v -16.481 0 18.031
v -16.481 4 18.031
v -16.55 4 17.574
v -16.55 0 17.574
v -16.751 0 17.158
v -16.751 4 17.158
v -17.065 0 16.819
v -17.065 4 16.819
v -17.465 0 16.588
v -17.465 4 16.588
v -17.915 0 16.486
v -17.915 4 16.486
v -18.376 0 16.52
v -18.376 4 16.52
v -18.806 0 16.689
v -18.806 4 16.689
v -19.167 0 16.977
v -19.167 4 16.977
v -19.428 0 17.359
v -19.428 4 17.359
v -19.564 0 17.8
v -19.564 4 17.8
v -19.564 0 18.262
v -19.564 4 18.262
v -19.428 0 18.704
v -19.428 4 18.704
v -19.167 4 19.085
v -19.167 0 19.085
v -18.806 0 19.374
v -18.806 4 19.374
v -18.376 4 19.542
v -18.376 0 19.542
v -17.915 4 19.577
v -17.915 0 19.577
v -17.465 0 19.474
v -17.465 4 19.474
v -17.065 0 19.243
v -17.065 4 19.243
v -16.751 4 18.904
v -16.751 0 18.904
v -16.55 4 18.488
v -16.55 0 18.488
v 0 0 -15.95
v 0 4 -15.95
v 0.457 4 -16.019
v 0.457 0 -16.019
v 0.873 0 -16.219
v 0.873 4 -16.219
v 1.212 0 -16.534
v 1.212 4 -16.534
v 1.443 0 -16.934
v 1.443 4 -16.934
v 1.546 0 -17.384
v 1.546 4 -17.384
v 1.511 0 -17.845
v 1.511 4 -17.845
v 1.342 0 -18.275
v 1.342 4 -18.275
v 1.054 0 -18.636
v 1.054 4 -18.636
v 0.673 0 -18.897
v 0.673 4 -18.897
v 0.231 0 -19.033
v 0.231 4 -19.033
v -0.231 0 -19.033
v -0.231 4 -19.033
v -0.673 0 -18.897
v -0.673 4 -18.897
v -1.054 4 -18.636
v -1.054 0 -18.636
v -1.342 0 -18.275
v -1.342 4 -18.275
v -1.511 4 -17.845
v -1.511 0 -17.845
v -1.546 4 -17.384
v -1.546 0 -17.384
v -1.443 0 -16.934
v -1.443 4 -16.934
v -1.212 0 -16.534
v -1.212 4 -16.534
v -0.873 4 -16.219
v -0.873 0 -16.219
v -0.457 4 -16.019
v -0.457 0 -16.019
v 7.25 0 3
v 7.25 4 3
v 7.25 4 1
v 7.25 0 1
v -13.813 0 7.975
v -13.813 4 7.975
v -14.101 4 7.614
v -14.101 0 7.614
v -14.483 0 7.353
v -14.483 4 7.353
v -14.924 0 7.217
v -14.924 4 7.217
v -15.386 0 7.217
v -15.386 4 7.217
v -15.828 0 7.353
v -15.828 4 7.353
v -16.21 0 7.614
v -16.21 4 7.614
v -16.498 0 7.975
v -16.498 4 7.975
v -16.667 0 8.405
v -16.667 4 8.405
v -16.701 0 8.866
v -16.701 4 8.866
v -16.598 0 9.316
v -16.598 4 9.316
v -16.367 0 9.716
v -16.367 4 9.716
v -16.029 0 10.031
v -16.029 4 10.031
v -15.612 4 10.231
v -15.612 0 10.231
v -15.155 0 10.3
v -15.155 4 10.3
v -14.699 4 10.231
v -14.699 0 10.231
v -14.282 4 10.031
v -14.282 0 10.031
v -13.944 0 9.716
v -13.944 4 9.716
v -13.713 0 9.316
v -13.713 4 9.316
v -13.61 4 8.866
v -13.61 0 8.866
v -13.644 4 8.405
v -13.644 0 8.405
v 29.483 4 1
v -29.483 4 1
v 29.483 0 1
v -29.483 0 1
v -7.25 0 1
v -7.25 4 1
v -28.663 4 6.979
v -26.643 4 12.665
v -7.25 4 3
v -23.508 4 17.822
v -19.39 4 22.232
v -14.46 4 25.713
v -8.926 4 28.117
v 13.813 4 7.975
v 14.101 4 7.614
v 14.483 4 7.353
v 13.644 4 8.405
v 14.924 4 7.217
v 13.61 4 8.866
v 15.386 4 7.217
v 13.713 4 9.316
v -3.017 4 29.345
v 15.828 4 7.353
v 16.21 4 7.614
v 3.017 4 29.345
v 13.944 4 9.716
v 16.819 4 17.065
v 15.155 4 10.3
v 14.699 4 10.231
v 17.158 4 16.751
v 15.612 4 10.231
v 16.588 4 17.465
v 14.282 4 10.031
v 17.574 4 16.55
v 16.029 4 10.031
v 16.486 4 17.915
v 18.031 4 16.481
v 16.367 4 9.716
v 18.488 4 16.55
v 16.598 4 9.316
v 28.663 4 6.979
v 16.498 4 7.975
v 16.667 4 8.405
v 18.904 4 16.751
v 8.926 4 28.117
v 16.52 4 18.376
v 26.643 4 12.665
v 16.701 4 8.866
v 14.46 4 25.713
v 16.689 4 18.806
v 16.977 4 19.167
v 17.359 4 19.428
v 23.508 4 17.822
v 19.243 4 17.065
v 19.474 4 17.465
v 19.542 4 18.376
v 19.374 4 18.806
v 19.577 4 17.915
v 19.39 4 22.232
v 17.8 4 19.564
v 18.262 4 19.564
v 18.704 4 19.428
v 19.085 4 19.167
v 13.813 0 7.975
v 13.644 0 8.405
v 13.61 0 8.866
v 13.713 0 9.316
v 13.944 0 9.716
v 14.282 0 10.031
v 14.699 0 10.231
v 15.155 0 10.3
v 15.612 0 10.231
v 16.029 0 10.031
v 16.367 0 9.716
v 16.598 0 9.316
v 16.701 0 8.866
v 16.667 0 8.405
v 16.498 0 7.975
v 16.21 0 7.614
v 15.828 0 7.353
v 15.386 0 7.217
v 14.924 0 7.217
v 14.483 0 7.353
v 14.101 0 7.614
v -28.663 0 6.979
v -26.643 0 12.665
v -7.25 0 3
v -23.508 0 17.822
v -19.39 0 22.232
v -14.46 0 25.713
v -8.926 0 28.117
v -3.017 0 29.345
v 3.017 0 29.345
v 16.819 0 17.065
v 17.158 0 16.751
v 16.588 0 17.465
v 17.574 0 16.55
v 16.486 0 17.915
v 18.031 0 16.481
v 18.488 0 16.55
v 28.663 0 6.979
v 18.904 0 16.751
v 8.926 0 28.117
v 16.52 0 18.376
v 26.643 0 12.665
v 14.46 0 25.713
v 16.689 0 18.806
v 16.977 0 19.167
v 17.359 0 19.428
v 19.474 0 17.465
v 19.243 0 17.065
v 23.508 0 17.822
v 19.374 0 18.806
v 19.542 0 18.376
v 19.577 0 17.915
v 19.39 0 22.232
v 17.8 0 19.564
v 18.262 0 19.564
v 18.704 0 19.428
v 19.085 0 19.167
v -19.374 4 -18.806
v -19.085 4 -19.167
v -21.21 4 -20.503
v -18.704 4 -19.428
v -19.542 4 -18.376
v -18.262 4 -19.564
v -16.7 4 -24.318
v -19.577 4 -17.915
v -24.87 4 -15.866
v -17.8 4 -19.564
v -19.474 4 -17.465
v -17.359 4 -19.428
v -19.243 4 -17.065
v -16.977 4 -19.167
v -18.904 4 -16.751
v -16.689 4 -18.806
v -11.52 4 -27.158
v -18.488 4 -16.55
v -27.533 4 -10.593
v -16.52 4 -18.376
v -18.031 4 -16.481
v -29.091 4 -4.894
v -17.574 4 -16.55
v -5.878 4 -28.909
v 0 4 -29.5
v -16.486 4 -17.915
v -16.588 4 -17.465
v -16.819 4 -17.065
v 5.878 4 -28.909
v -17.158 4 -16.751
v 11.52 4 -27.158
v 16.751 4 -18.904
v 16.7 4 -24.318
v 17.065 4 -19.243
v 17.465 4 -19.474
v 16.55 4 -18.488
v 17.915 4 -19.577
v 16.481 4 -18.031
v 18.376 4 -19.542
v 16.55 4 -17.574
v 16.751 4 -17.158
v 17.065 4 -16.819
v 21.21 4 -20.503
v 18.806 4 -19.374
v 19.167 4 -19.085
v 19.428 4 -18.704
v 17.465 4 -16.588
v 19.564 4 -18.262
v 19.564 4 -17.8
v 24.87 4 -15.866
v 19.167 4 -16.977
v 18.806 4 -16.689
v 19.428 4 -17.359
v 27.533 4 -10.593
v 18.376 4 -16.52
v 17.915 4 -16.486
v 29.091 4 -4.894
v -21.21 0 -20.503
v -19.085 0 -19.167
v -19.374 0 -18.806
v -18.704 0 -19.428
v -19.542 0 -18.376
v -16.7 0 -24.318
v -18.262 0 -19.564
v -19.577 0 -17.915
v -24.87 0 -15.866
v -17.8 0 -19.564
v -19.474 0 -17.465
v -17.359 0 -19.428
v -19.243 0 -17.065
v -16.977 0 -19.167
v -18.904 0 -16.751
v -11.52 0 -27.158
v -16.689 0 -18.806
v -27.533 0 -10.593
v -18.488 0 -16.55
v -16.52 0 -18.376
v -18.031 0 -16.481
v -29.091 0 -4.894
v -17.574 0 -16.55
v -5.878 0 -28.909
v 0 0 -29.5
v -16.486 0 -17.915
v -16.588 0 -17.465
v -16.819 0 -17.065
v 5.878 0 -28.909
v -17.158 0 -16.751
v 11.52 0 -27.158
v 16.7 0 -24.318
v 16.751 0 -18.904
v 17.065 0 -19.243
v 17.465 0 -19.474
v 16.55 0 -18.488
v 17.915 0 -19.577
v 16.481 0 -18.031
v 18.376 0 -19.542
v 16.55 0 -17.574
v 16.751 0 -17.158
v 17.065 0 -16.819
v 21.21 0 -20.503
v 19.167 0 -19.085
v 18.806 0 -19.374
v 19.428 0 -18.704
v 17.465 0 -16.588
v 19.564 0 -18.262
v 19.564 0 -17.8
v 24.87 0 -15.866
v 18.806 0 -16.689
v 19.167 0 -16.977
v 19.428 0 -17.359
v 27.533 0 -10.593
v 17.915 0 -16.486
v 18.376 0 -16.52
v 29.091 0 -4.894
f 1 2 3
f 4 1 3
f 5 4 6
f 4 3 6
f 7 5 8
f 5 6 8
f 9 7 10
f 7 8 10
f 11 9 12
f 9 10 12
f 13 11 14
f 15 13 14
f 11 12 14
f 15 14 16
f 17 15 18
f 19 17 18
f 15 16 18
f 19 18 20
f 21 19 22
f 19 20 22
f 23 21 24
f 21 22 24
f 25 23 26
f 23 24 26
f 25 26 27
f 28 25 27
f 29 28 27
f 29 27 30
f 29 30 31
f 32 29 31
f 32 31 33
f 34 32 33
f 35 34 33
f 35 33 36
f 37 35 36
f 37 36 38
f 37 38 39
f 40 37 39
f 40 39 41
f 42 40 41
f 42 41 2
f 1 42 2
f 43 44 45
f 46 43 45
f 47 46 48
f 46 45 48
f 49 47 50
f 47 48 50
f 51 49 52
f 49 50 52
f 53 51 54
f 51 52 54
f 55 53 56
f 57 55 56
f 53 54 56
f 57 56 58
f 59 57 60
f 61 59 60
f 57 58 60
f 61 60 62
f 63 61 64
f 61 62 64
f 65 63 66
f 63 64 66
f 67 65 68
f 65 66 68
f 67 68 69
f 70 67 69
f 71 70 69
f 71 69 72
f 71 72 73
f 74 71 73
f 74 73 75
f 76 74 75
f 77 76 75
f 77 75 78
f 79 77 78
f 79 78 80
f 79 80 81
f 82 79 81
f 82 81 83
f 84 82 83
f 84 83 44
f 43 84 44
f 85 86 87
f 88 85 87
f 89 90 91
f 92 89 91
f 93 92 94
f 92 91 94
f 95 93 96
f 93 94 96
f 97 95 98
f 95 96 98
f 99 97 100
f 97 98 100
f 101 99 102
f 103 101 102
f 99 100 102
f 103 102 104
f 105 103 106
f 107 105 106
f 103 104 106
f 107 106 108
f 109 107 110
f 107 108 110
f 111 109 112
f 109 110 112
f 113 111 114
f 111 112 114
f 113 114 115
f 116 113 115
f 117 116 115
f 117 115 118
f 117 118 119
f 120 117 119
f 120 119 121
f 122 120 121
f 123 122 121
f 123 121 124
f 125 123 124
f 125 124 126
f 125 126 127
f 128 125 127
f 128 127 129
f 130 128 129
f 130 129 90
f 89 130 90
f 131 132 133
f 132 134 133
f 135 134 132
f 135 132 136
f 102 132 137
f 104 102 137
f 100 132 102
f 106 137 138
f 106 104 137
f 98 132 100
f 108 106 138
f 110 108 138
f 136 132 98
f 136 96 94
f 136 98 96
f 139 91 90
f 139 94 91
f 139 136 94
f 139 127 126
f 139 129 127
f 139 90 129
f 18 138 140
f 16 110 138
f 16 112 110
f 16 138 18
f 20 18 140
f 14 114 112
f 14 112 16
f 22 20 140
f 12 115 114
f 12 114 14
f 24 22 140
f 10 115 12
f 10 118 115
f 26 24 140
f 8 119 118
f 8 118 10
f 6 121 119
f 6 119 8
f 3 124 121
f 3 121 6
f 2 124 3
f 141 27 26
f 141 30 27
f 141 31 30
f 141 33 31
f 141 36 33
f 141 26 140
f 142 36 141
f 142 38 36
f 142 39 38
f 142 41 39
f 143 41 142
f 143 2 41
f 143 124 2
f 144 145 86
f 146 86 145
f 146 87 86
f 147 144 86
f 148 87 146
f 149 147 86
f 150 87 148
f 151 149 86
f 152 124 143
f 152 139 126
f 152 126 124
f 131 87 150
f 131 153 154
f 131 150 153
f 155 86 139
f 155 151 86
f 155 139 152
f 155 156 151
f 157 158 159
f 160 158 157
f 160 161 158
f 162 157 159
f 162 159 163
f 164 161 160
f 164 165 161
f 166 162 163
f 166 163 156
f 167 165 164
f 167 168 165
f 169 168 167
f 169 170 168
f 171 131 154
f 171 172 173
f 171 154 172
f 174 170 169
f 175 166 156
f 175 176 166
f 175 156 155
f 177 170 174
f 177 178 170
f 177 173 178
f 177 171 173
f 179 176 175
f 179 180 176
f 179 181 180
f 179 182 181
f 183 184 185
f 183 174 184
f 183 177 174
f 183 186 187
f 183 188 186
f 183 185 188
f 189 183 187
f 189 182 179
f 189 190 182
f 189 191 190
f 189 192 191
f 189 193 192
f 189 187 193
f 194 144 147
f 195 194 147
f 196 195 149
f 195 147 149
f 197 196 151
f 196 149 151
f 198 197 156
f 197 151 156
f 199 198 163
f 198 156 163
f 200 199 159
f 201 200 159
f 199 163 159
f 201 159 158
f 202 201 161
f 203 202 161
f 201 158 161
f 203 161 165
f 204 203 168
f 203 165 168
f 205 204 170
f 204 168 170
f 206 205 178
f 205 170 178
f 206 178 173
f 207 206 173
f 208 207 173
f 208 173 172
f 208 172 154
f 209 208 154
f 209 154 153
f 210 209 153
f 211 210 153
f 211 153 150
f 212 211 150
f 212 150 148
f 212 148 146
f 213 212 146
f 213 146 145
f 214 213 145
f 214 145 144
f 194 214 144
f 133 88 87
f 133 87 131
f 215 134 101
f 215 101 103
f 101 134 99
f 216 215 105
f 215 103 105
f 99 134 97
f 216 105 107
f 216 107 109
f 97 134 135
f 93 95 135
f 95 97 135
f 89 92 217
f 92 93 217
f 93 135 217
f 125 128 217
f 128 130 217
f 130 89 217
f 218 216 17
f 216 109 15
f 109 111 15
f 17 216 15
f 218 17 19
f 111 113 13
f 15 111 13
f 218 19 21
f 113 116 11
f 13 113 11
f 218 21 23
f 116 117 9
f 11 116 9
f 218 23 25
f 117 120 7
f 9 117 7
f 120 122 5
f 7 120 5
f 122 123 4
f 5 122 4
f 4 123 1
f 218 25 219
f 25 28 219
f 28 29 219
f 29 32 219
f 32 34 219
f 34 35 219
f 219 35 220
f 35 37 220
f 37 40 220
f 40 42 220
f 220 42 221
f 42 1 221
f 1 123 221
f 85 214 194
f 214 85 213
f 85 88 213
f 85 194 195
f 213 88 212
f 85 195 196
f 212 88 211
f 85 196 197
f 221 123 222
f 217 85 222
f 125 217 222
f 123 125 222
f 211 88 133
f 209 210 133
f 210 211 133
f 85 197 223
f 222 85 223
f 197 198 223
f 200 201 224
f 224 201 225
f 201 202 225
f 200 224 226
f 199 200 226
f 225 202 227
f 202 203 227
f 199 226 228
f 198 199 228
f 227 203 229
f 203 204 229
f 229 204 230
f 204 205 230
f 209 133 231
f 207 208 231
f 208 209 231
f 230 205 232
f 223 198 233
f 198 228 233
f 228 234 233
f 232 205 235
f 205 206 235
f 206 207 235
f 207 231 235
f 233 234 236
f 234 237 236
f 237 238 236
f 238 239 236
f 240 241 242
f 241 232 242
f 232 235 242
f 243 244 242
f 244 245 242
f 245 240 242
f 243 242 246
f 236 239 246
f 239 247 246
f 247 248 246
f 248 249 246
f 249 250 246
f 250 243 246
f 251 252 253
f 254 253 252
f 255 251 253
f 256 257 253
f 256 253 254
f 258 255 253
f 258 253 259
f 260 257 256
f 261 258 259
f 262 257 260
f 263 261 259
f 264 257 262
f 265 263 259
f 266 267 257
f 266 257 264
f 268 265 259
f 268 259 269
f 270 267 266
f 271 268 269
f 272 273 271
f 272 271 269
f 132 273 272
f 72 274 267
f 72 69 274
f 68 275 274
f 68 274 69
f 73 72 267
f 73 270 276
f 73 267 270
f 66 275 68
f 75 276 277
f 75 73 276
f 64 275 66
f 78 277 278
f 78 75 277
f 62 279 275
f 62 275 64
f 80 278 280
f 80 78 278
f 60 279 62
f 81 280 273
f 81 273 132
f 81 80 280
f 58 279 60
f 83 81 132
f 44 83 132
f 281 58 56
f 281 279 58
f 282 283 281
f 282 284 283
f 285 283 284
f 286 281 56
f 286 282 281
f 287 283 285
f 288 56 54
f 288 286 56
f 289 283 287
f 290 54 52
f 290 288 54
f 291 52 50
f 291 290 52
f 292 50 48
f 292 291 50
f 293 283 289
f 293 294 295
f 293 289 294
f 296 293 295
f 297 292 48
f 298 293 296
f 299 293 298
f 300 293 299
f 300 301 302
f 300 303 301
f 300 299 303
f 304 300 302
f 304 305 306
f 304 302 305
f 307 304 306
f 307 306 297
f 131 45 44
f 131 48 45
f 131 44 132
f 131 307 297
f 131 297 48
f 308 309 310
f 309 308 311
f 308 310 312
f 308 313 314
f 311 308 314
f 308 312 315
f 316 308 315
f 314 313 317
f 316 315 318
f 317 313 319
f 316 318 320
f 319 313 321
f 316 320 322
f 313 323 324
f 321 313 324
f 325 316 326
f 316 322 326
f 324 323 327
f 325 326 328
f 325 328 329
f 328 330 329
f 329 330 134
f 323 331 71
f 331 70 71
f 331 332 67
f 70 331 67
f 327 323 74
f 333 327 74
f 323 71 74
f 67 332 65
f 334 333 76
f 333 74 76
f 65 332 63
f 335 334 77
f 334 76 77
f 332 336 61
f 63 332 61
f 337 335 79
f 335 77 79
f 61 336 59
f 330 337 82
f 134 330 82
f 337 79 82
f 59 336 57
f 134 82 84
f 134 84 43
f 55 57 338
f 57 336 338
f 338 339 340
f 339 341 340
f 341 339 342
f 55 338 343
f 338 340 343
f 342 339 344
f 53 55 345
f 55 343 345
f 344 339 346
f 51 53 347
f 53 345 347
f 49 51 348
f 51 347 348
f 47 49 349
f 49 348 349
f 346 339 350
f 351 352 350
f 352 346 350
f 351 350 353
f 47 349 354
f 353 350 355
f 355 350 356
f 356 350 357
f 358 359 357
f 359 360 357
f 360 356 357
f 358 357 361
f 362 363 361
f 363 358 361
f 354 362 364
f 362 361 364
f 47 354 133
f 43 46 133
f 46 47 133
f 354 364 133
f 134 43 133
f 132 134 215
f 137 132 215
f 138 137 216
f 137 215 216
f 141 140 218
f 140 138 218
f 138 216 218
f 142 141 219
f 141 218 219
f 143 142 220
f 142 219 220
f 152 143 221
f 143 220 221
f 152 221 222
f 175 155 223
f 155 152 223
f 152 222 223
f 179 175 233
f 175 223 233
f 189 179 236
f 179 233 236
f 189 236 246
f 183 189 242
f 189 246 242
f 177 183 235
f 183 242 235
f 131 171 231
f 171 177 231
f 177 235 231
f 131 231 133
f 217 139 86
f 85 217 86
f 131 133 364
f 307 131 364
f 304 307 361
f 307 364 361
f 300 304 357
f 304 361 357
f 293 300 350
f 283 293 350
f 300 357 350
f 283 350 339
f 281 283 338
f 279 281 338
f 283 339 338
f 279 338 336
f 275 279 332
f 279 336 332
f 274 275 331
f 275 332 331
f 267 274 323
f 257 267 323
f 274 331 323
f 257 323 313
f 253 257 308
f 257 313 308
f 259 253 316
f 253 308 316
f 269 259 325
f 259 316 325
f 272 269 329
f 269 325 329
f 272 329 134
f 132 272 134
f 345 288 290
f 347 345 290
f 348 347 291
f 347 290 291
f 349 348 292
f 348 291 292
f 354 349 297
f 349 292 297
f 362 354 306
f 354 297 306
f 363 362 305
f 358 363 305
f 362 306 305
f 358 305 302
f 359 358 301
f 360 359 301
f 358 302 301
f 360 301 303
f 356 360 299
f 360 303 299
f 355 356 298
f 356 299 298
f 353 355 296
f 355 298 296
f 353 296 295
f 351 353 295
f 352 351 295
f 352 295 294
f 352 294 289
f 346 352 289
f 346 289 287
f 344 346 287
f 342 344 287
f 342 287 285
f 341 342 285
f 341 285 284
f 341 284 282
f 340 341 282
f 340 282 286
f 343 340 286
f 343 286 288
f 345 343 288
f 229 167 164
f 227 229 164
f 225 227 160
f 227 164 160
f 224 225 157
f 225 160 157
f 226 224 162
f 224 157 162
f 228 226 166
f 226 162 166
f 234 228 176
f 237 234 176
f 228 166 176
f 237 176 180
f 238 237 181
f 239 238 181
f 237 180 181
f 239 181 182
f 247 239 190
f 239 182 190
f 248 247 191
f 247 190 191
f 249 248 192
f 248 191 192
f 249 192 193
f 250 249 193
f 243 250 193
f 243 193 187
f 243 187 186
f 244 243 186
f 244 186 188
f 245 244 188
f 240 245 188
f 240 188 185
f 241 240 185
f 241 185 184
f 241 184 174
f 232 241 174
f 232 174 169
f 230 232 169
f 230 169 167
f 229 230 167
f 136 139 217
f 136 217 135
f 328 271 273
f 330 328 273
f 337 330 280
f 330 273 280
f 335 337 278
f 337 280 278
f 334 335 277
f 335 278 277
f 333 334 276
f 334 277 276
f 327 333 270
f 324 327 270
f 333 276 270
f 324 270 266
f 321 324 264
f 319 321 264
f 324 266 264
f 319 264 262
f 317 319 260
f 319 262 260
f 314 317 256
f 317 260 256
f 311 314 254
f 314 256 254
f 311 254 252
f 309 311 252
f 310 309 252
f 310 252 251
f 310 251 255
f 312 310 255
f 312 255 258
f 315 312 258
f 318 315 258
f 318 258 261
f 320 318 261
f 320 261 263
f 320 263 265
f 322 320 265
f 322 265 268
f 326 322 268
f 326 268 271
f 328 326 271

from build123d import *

# Parameters (mm, degrees)
SKETCH1_R              = 29.5
BOSS_EXTRUDE1_DEPTH    = 4
SKETCH2_R              = 1.55
CUT_EXTRUDE1_DEPTH     = 42.910619179
CIRPATTERN1_COUNT      = 4
SKETCH3_W              = 14.5
SKETCH3_H              = 2
CUT_EXTRUDE2_DEPTH     = 42.910619179
SKETCH9_R              = 1.55
CUT_EXTRUDE3_DEPTH     = 42.910619179
CIRPATTERN4_COUNT      = 3
SPLIT1_SURFACE_1_BACK  = 84.534
SPLIT1_SURFACE_1_DEPTH = 169.068
SPLIT1_SURFACE_2_BACK  = 84.534
SPLIT1_SURFACE_2_DEPTH = 169.068


with BuildPart() as part:
    # Sketch1 → Boss-Extrude1 (new body)
    with BuildSketch(Plane(origin=(0, 0, 0), x_dir=(1, 0, 0), z_dir=(0, 1, 0))):
        with Locations(Location((0, 0, 0), (0, 0, 270))):
            Circle(SKETCH1_R)
    extrude(amount=BOSS_EXTRUDE1_DEPTH)

    # Sketch2 → Cut-Extrude1 (cut, through all)
    with BuildSketch(Plane(origin=(0, 4, 0), x_dir=(1, 0, 0), z_dir=(0, 1, 0))):
        with Locations(Location((-18.03122292, 18.03122292, 0), (0, 0, 270))):
            Circle(SKETCH2_R)
    cut_extrude1 = extrude(amount=-CUT_EXTRUDE1_DEPTH, mode=Mode.SUBTRACT)

    # CirPattern1: Cut-Extrude1 ×4 about axis
    cirpattern1_axis = Axis((0, 0, 0), (0, 1, 0))
    for i in range(1, CIRPATTERN1_COUNT):
        add(cut_extrude1.rotate(cirpattern1_axis, i * 360 / CIRPATTERN1_COUNT), mode=Mode.SUBTRACT)

    # Sketch3 → Cut-Extrude2 (cut, through all)
    with BuildSketch(Plane(origin=(0, 4, 0), x_dir=(1, 0, 0), z_dir=(0, 1, 0))):
        with Locations((0, -2)):
            Rectangle(SKETCH3_W, SKETCH3_H)
    extrude(amount=-CUT_EXTRUDE2_DEPTH, mode=Mode.SUBTRACT)

    # Sketch9 → Cut-Extrude3 (cut, through all)
    with BuildSketch(Plane(origin=(0, 4, 0), x_dir=(1, 0, 0), z_dir=(0, 1, 0))):
        with Locations(Location((0, 17.5, 0), (0, 0, 270))):
            Circle(SKETCH9_R)
    cut_extrude3 = extrude(amount=-CUT_EXTRUDE3_DEPTH, mode=Mode.SUBTRACT)

    # CirPattern4: Cut-Extrude3 ×3 about axis
    cirpattern4_axis = Axis((0, 0, 0), (0, 1, 0))
    for i in range(1, CIRPATTERN4_COUNT):
        add(cut_extrude3.rotate(cirpattern4_axis, i * 360 / CIRPATTERN4_COUNT), mode=Mode.SUBTRACT)


with BuildPart() as body_2:
    # Split1: the piece behind the surface
    add(part.part)
    # Split1 surface: a surface, the sketch's curves swept straight by 169.068 mm
    with BuildLine(Plane(origin=(0, 0, 0), x_dir=(1, 0, 0), z_dir=(0, 1, 0)).offset(-SPLIT1_SURFACE_1_BACK), mode=Mode.PRIVATE) as split1_surface_1_path:
        Line((-30.661720474, -1), (30.661720474, -1))
    split1_surface_1 = Shell.extrude(split1_surface_1_path.wire(), (0 * SPLIT1_SURFACE_1_DEPTH, 1 * SPLIT1_SURFACE_1_DEPTH, 0 * SPLIT1_SURFACE_1_DEPTH))
    split(bisect_by=split1_surface_1, keep=Keep.BOTTOM)


with BuildPart() as part_1:
    add(part.part)

    # Split1: split by a surface, the side it looks to stays
    # Split1 surface: a surface, the sketch's curves swept straight by 169.068 mm
    with BuildLine(Plane(origin=(0, 0, 0), x_dir=(1, 0, 0), z_dir=(0, 1, 0)).offset(-SPLIT1_SURFACE_2_BACK), mode=Mode.PRIVATE) as split1_surface_2_path:
        Line((-30.661720474, -1), (30.661720474, -1))
    split1_surface_2 = Shell.extrude(split1_surface_2_path.wire(), (0 * SPLIT1_SURFACE_2_DEPTH, 1 * SPLIT1_SURFACE_2_DEPTH, 0 * SPLIT1_SURFACE_2_DEPTH))
    split(bisect_by=split1_surface_2, keep=Keep.TOP)


solid = Compound([body_2.part, part_1.part])
